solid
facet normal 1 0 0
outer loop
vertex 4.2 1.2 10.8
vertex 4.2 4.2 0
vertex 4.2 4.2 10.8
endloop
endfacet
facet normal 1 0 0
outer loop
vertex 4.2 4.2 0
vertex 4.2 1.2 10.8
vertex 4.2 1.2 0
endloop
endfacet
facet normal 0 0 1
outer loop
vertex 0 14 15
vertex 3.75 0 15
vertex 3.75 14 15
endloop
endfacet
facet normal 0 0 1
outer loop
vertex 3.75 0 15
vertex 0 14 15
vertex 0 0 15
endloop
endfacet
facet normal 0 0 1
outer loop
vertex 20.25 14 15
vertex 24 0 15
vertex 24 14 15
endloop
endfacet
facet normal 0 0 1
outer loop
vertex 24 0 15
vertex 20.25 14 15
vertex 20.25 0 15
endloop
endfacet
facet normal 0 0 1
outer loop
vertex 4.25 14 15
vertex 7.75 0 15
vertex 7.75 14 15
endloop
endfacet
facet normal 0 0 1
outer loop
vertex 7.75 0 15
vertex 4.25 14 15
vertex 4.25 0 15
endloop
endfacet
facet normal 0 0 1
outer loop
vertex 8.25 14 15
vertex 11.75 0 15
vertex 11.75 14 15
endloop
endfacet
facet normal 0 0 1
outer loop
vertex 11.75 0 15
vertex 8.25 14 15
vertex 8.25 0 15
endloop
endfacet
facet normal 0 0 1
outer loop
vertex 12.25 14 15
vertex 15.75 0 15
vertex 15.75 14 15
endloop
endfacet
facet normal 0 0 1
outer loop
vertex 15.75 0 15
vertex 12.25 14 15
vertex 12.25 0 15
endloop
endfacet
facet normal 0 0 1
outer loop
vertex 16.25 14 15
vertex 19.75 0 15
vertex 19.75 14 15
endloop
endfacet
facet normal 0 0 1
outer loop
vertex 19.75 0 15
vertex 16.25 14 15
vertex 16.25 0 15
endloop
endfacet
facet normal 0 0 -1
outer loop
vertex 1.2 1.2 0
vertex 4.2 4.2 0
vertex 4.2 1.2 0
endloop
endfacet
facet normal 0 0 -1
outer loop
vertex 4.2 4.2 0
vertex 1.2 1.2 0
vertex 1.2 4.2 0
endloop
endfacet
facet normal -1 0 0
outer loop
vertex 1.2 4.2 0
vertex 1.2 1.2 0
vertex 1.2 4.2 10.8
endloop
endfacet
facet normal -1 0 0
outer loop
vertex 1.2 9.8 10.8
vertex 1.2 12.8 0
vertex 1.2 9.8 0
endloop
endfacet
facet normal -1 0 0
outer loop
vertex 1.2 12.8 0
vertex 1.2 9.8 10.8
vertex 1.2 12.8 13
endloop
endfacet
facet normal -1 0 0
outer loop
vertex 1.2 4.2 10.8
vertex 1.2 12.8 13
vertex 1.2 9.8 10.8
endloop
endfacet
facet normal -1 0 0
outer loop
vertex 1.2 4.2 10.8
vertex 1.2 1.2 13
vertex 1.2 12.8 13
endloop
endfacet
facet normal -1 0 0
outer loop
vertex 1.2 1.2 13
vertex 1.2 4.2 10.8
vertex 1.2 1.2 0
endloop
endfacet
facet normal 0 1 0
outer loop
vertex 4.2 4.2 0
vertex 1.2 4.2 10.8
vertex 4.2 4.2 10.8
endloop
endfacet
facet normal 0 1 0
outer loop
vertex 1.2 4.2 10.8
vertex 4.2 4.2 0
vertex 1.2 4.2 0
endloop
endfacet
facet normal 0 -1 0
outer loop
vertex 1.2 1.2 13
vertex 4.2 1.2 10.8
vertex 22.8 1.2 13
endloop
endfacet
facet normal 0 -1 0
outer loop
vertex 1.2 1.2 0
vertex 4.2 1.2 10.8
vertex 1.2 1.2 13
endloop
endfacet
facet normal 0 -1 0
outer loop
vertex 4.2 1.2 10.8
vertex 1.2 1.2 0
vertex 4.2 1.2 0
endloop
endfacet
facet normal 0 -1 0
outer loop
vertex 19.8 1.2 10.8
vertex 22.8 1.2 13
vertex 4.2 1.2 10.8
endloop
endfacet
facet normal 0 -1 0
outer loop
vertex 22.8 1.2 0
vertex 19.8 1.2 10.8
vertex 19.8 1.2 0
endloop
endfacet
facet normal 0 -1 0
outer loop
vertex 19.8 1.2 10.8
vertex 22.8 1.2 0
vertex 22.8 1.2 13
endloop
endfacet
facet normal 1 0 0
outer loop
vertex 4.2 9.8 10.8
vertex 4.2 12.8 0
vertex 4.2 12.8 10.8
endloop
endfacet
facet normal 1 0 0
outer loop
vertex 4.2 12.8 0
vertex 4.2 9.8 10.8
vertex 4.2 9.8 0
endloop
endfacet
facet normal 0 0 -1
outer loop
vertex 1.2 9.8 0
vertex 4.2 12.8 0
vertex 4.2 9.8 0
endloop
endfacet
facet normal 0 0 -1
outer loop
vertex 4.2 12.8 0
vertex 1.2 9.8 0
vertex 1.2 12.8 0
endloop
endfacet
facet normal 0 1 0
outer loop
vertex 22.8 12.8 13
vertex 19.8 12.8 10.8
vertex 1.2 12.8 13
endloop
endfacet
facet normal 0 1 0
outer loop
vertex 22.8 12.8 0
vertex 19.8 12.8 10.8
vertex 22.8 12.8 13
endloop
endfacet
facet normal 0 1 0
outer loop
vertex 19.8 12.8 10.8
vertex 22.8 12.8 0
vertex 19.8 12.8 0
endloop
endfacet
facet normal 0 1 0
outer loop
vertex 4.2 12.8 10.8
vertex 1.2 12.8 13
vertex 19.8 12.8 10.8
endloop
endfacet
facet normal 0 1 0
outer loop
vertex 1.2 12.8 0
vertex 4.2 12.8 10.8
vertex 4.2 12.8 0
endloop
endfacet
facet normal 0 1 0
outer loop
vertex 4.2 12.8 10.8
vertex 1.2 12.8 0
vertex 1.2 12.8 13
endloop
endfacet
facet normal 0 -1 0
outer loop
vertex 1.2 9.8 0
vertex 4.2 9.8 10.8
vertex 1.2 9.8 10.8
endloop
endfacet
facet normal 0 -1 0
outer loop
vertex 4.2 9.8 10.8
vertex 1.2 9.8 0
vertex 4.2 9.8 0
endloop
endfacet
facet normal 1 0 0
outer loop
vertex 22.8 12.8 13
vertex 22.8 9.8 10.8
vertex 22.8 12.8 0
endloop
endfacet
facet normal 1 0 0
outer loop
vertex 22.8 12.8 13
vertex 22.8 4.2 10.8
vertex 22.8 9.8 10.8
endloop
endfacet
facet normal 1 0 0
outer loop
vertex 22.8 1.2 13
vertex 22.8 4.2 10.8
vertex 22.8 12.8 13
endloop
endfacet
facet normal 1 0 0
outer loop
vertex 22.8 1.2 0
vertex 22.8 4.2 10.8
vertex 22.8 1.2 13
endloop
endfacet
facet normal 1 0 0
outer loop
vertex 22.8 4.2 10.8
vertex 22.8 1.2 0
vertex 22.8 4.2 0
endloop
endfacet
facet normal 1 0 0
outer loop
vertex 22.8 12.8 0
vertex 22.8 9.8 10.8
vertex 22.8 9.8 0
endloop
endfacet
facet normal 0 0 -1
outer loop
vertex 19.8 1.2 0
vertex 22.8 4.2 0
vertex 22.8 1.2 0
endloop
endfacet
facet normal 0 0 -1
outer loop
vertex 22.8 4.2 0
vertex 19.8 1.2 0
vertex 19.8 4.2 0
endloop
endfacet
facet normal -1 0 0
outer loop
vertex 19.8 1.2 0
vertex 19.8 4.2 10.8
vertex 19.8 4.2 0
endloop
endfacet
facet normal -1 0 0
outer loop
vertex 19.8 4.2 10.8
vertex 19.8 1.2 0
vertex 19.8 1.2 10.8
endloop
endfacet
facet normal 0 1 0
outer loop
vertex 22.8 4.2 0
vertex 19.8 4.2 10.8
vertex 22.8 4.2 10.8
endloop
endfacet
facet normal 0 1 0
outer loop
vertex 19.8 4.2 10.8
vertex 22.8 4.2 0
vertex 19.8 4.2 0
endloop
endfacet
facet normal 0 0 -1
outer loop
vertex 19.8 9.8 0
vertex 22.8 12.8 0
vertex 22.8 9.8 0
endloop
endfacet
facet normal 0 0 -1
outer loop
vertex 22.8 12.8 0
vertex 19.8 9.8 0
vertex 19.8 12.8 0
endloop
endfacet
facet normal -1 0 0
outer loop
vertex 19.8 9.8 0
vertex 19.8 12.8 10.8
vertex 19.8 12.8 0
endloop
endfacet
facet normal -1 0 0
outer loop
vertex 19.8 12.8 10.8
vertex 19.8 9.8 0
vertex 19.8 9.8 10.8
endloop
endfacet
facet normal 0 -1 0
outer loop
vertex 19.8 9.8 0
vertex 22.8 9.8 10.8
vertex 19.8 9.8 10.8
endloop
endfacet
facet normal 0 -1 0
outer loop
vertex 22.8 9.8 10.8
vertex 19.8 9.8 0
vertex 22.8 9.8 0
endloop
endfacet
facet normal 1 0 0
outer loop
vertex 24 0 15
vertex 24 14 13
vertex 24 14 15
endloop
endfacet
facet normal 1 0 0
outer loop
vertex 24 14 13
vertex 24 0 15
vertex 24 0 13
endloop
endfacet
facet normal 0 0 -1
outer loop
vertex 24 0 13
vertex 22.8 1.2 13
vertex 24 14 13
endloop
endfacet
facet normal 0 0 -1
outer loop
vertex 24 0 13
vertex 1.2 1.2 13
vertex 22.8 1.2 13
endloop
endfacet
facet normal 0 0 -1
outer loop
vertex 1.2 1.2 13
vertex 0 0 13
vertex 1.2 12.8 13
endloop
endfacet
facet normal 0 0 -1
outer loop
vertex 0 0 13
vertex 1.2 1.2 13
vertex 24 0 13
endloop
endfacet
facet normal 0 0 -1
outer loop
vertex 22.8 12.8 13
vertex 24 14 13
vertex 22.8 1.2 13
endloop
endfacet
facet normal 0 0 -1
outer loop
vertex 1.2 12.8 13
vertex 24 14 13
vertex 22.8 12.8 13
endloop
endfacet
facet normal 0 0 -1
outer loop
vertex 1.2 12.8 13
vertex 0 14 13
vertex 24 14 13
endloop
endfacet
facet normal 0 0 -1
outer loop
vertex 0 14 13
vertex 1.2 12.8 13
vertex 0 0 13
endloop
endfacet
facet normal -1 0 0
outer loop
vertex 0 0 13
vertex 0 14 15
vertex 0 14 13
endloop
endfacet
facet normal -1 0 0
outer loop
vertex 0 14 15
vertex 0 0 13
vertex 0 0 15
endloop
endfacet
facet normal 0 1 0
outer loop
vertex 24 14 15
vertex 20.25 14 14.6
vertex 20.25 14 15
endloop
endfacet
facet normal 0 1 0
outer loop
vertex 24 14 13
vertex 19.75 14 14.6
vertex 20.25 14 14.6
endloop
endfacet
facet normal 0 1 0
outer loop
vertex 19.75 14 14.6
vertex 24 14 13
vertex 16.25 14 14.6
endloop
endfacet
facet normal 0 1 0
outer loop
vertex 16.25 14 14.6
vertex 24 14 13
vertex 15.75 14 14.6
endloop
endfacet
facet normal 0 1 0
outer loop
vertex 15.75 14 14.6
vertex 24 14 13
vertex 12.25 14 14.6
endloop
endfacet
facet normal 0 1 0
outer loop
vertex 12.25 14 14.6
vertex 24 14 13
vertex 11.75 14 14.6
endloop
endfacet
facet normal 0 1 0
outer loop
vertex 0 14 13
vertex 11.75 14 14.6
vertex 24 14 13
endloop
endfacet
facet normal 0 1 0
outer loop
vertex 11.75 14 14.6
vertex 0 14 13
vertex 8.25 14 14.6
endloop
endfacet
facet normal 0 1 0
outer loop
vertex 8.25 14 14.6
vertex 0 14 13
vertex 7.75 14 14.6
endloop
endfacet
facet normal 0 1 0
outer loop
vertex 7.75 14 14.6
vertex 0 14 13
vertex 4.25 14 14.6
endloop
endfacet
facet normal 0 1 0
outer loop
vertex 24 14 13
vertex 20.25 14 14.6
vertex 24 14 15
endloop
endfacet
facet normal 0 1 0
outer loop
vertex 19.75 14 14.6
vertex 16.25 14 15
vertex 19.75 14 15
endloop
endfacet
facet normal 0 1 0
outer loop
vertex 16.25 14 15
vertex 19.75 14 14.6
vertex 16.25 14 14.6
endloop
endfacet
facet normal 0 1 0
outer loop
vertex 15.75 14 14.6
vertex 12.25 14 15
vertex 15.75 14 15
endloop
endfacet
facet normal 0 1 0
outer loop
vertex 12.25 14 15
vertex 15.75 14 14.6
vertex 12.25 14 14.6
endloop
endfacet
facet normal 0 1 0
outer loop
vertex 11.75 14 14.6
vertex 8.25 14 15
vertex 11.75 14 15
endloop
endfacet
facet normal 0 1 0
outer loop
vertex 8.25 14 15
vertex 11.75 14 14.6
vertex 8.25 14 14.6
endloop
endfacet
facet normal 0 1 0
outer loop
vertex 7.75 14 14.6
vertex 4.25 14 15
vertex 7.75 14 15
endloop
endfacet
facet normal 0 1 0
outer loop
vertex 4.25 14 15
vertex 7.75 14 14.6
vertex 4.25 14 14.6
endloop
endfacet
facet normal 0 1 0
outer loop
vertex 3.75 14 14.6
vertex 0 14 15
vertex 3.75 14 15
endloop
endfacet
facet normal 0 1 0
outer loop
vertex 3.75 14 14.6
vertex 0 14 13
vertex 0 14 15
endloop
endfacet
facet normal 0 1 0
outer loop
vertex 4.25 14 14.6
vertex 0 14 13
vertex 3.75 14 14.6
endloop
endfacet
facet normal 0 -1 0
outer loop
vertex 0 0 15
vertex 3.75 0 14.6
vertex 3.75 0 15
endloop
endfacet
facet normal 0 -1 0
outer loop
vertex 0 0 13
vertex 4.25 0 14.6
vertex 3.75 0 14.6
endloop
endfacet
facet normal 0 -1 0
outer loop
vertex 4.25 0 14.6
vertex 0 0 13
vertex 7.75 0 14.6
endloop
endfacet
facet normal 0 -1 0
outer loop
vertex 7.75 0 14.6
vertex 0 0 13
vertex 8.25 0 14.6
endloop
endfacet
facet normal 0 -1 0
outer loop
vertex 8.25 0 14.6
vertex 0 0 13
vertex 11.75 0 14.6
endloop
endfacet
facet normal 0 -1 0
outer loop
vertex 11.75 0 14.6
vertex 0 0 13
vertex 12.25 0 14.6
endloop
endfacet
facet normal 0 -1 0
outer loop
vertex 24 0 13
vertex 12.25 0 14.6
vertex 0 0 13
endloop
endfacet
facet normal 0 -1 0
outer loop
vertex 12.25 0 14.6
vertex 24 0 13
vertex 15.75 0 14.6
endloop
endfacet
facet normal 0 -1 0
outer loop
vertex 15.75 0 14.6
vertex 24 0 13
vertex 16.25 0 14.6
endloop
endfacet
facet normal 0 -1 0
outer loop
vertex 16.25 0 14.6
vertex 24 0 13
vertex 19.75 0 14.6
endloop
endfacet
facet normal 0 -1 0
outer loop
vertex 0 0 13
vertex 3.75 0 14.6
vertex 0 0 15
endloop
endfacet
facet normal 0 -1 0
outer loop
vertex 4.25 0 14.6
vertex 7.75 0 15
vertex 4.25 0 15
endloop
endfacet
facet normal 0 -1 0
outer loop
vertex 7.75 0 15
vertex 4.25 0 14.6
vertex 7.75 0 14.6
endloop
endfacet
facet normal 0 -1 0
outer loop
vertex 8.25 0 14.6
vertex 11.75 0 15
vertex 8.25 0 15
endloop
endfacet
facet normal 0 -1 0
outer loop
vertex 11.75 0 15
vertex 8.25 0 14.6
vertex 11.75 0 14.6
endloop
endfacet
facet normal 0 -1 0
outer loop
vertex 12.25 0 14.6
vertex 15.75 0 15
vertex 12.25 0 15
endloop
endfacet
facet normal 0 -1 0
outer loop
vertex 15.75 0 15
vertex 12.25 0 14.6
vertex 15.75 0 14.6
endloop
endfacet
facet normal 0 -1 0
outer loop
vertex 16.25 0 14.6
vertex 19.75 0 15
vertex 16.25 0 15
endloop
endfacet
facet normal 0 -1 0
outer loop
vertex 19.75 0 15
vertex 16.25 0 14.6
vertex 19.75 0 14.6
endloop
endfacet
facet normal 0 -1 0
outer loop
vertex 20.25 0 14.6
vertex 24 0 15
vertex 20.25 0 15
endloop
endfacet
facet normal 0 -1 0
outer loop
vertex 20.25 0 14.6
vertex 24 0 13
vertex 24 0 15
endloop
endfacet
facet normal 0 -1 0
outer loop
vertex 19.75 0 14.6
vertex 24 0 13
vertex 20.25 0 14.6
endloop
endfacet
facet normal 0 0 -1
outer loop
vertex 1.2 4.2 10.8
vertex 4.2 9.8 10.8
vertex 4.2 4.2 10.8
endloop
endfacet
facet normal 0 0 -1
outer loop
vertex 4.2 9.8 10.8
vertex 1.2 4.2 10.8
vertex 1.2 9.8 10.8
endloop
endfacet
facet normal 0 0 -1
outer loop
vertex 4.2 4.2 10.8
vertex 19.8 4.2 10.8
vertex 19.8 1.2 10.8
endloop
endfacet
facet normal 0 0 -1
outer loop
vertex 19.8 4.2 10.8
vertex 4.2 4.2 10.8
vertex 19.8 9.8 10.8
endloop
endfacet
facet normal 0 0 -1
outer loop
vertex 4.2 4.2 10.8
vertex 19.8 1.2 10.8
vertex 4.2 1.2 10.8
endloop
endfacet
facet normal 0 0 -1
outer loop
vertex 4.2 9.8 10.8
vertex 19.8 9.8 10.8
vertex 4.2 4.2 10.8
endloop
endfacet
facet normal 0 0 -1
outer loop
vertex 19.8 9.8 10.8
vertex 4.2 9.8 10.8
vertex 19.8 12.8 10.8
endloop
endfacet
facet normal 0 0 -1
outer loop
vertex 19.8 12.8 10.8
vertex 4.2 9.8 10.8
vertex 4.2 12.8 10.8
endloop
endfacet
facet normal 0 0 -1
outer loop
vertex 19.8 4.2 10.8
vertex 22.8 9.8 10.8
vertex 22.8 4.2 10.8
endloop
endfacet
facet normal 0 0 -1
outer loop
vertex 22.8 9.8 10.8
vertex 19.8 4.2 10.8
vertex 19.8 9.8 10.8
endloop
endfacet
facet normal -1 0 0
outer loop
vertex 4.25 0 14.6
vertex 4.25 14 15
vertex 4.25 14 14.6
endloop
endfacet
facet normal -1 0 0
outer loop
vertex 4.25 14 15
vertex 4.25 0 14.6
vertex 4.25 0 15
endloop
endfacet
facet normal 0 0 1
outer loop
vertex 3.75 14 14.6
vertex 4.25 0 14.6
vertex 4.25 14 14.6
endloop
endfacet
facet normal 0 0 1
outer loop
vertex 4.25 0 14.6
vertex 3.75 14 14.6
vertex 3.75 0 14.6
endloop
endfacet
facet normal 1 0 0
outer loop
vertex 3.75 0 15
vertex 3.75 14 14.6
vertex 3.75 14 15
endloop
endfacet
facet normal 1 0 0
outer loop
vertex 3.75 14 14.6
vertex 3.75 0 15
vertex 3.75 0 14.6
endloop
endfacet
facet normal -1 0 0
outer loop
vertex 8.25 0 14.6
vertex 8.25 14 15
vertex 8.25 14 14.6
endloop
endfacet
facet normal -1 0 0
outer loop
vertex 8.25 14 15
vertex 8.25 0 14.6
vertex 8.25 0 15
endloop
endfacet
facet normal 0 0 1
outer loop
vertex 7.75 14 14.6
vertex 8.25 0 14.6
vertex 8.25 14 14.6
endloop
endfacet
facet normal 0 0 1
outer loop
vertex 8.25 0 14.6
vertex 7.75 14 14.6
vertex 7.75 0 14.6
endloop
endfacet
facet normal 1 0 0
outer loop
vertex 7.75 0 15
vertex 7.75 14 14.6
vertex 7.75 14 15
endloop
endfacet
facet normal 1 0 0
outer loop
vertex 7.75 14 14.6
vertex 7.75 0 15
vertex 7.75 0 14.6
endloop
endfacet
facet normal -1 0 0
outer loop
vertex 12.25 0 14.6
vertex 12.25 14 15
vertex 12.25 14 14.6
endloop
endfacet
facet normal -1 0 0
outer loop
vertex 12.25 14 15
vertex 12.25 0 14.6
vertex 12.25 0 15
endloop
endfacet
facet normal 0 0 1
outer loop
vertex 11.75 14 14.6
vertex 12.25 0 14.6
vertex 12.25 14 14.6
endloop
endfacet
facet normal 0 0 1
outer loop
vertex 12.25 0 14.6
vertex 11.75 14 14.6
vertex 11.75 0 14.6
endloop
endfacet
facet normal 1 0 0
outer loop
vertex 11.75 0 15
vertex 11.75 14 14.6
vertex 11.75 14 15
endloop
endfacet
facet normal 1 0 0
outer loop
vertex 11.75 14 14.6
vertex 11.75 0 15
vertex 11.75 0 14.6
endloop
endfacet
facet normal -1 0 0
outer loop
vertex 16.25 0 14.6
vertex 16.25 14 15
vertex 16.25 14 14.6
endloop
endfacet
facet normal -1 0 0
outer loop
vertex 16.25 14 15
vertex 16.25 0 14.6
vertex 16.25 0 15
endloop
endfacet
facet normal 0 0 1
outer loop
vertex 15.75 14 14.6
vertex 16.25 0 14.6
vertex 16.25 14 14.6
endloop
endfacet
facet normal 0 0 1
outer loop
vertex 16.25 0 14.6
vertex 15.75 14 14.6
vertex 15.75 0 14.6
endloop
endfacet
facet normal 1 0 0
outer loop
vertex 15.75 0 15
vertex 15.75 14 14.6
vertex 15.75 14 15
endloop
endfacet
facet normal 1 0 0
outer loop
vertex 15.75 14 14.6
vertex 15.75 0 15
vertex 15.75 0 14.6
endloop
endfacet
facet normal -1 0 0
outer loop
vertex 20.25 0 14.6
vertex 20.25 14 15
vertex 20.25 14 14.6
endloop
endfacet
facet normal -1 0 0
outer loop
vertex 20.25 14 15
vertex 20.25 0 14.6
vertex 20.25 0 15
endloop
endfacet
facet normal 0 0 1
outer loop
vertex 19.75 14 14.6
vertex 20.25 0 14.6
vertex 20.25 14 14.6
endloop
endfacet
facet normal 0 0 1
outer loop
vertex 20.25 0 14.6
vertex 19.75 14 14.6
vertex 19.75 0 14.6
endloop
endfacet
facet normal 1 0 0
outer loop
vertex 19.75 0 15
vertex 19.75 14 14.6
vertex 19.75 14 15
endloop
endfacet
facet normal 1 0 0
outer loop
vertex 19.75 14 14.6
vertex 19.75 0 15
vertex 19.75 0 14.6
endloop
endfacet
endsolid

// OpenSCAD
// file: ../lib/furniture.scad
// furniture.scad — scatter furniture for 28mm terrain.
// Requires grid.scad (for scaled() and EPS). No connector system —
// these are loose set-dressing pieces.
//
// Every piece is designed for ONE support-free print orientation:
//   inverted (legs up):  table, bench, stool
//   upright:             bed, wardrobe, throne, chest
//   on its back:         bookshelf (shelves/books become vertical walls)
//   flat:                ladder
// Crowns and ledges stay within 45 degrees; underside gaps are avoided
// by solid plinths.

FURNITURE = "table";
FURN_SEED = 3;
LADDER_L  = 58;   // scaled; default reaches a deck resting on walls

// Shallow plank grooves cut down from a top surface at z = 0.
module plank_etch(w, l, plank = 4, depth = 0.4) {
    for (x = [scaled(plank) : scaled(plank) : w - 1])
        translate([x - 0.25, -EPS, -depth])
            cube([0.5, l + 2 * EPS, depth + EPS]);
}

// ---- tables & seating (print inverted: top on the bed, legs up) ----
module f_table() {
    tw = scaled(24); td = scaled(14); th = scaled(15);
    tt = scaled(2);  leg = scaled(3); in = scaled(1.2);
    difference() {
        union() {
            translate([0, 0, th - tt]) cube([tw, td, tt]);
            translate([in, in, th - tt - scaled(2.2)])
                cube([tw - 2 * in, td - 2 * in, scaled(2.2) + EPS]);
            for (x = [in, tw - leg - in], y = [in, td - leg - in])
                translate([x, y, 0]) cube([leg, leg, th]);
        }
        translate([0, 0, th]) plank_etch(tw, td);
    }
}

module f_bench() {
    bw = scaled(20); bd = scaled(5); bh = scaled(10); tt = scaled(1.8);
    difference() {
        union() {
            translate([0, 0, bh - tt]) cube([bw, bd, tt]);
            for (x = [scaled(1), bw - scaled(3)])
                translate([x, scaled(0.5), 0])
                    cube([scaled(2), bd - scaled(1), bh]);
        }
        translate([0, 0, bh]) plank_etch(bw, bd);
    }
}

module f_stool() {
    sd = scaled(7); sh = scaled(8); tt = scaled(1.6); leg = scaled(1.8);
    translate([sd / 2, sd / 2, sh - tt]) cylinder(h = tt, d = sd);
    for (x = [scaled(0.8), sd - leg - scaled(0.8)],
         y = [scaled(0.8), sd - leg - scaled(0.8)])
        translate([x, y, 0]) cube([leg, leg, sh - tt + EPS]);
}

// ---- bed (print upright; solid base, wedge pillow) -----------------
module f_bed() {
    bw = scaled(16); bl = scaled(32); base = scaled(6);
    hb = scaled(16); fb = scaled(10); bt = scaled(2);
    difference() {
        union() {
            cube([bw, bl, base]);
            cube([bw, bt, hb]);
            translate([0, bl - bt, 0]) cube([bw, bt, fb]);
        }
        // blanket seam across the mattress top
        translate([-EPS, bl * 0.42, base - 0.4])
            cube([bw + 2 * EPS, 0.6, 0.4 + EPS]);
    }
    // pillow: 55-degree wedge, printable without support
    translate([scaled(2), scaled(3), base - EPS])
        hull() {
            cube([scaled(12), scaled(6), EPS]);
            translate([scaled(1.5), scaled(1.5), scaled(2.2)])
                cube([scaled(9), scaled(3), EPS]);
        }
}

// ---- wardrobe (print upright; 45-degree crown, etched doors) -------
module f_wardrobe() {
    w = scaled(22); d = scaled(11); h = scaled(36); ch = scaled(1.2);
    difference() {
        union() {
            cube([w, d, h - ch]);
            translate([0, 0, h - ch])
                hull() {
                    cube([w, d, EPS]);
                    translate([-scaled(1), -scaled(1), ch - EPS])
                        cube([w + scaled(2), d + scaled(2), EPS]);
                }
        }
        // recessed door panels and center split, front face y = 0
        for (x = [scaled(2), w / 2 + scaled(1)])
            translate([x, -EPS, scaled(4)])
                cube([w / 2 - scaled(3), 0.5 + EPS, h - scaled(10)]);
        translate([w / 2 - 0.3, -EPS, scaled(1.5)])
            cube([0.6, 0.5 + EPS, h - scaled(5)]);
    }
    for (x = [w / 2 - scaled(1.8), w / 2 + scaled(1.8)])
        translate([x, 0.3, h * 0.52]) sphere(d = scaled(1.5));
}

// ---- bookshelf (print ON ITS BACK: everything becomes a wall) ------
module f_bookshelf() {
    w = scaled(20); d = scaled(8); h = scaled(30); p = scaled(1.5);
    shelves = 3;
    cube([w, p, h]);                                   // back panel
    for (x = [0, w - p]) translate([x, 0, 0]) cube([p, d, h]);
    cube([w, d, p]);
    translate([0, 0, h - p]) cube([w, d, p]);
    gap = (h - 2 * p - shelves * p) / (shelves + 1);
    for (s = [1 : shelves])
        translate([0, 0, p + s * gap + (s - 1) * p])
            cube([w, d - scaled(0.5), p]);
    // seeded rows of books standing on each level
    for (s = [0 : shelves]) {
        z0 = p + s * (gap + p);
        hts = rands(gap * 0.45, gap * 0.8, 12, FURN_SEED * 7 + s);
        wds = rands(1.2, 2.6, 12, FURN_SEED * 11 + s);
        xacc = p + scaled(0.6);
        for (i = [0 : 9]) {
            x0 = xacc + i * (w - 2 * p - scaled(1.2)) / 10;
            if (x0 + scaled(wds[i]) < w - p - scaled(0.6))
                translate([x0, p - EPS, z0 - EPS])
                    cube([scaled(wds[i]), d - scaled(2.5), hts[s == 0 ? i : 11 - i]]);
        }
    }
}

// ---- throne / king's chair (print upright; all-solid masses) -------
module f_throne() {
    w = scaled(11); d = scaled(10); seat = scaled(9);
    bt = scaled(2.5); H = scaled(28); arm = scaled(2);
    difference() {
        union() {
            cube([w, d, seat]);                        // solid plinth
            cube([w, bt, H]);                          // tall back
            for (x = [0, w - arm])
                translate([x, 0, 0])
                    cube([arm, d - scaled(1.5), seat + scaled(6)]);
            for (x = [0, w - arm])                     // finials
                translate([x, 0, H]) cube([arm, bt, scaled(2.5)]);
        }
        // diamond etch on the backrest's front face
        translate([w / 2, bt + 0.4, (seat + H) / 2])
            rotate([90, 45, 0])
                linear_extrude(height = 0.5)
                    square(scaled(4.6), center = true);
    }
}

// ---- chest (print upright; barrel lid domes gradually) -------------
module f_chest() {
    w = scaled(12); d = scaled(8); h = scaled(6);
    difference() {
        union() {
            cube([w, d, h]);
            translate([0, 0, h]) intersection() {
                translate([0, d / 2, 0]) rotate([0, 90, 0])
                    cylinder(h = w, d = d);
                cube([w, d, d / 2]);
            }
        }
        // lid seam ring around the body just below the lid
        translate([-EPS, -EPS, h - 0.5])
            difference() {
                cube([w + 2 * EPS, d + 2 * EPS, 0.5]);
                translate([0.4 + EPS, 0.4 + EPS, -EPS])
                    cube([w - 0.8, d - 0.8, 0.5 + 2 * EPS]);
            }
    }
    // hasp on the front face
    translate([w / 2 - scaled(0.9), -0.3, h - scaled(1.6)])
        cube([scaled(1.8), 0.7, scaled(2.6)]);
}

// ---- ladder (print flat) --------------------------------------------
module f_ladder(len = 0) {
    L  = len > 0 ? len : scaled(LADDER_L);
    rw = scaled(2.2); rt = scaled(2); w = scaled(9);
    for (x = [0, w - rw]) translate([x, 0, 0]) cube([rw, L, rt]);
    for (y = [scaled(4) : scaled(6) : L - scaled(3)])
        translate([0, y, 0]) cube([w, scaled(1.8), rt]);
}

module furniture_piece(kind = FURNITURE) {
    if (kind == "table")     f_table();
    if (kind == "bench")     f_bench();
    if (kind == "stool")     f_stool();
    if (kind == "bed")       f_bed();
    if (kind == "wardrobe")  f_wardrobe();
    if (kind == "bookshelf") f_bookshelf();
    if (kind == "throne")    f_throne();
    if (kind == "chest")     f_chest();
    if (kind == "ladder")    f_ladder();
}
// file: ../lib/grid.scad
// grid.scad — core grid, scale, and tolerance foundation.
// Every piece in the system includes this file.
//
// Two classes of dimension, never mixed:
//   scaled()  — aesthetic sizes; follow SCALE so kits can be resized.
//   absolute  — fit-critical sizes (clearances, magnet pockets, pin
//               holes); constant regardless of SCALE.

// One tabletop grid square. 25.4mm (1 inch) keeps pieces in register
// with battlemats and standard 2-inch tile systems. Change once to
// retarget the whole library (e.g. 32 for a 32mm module standard).
GRID_UNIT = 25.4;

// Aesthetic scale multiplier (1.0 = 28mm heroic terrain).
SCALE = 1.0;

// Default structural sizes (scaled, mm at SCALE = 1.0).
FLOOR_THICKNESS   = 4;
WALL_THICKNESS    = 6;
WALL_HEIGHT_UNITS = 2;   // wall height in grid units

// Fit preset: "tight" | "normal" | "loose". Absolute mm — never scaled.
FIT = "normal";

function fit_clearance(fit = FIT) =
    fit == "tight" ? 0.10 :
    fit == "loose" ? 0.25 :
                     0.15;

// Helpers.
function scaled(x) = x * SCALE;
function grid(n)   = n * GRID_UNIT * SCALE;

// Boolean-overlap epsilon for clean CSG.
EPS = 0.01;

// Curve quality.
$fa = 4;
$fs = 0.4;
// main file
// furniture.scad — scatter furniture dispatcher; pick via FURNITURE.
include <../lib/grid.scad>
include <../lib/furniture.scad>

furniture_piece(FURNITURE);
